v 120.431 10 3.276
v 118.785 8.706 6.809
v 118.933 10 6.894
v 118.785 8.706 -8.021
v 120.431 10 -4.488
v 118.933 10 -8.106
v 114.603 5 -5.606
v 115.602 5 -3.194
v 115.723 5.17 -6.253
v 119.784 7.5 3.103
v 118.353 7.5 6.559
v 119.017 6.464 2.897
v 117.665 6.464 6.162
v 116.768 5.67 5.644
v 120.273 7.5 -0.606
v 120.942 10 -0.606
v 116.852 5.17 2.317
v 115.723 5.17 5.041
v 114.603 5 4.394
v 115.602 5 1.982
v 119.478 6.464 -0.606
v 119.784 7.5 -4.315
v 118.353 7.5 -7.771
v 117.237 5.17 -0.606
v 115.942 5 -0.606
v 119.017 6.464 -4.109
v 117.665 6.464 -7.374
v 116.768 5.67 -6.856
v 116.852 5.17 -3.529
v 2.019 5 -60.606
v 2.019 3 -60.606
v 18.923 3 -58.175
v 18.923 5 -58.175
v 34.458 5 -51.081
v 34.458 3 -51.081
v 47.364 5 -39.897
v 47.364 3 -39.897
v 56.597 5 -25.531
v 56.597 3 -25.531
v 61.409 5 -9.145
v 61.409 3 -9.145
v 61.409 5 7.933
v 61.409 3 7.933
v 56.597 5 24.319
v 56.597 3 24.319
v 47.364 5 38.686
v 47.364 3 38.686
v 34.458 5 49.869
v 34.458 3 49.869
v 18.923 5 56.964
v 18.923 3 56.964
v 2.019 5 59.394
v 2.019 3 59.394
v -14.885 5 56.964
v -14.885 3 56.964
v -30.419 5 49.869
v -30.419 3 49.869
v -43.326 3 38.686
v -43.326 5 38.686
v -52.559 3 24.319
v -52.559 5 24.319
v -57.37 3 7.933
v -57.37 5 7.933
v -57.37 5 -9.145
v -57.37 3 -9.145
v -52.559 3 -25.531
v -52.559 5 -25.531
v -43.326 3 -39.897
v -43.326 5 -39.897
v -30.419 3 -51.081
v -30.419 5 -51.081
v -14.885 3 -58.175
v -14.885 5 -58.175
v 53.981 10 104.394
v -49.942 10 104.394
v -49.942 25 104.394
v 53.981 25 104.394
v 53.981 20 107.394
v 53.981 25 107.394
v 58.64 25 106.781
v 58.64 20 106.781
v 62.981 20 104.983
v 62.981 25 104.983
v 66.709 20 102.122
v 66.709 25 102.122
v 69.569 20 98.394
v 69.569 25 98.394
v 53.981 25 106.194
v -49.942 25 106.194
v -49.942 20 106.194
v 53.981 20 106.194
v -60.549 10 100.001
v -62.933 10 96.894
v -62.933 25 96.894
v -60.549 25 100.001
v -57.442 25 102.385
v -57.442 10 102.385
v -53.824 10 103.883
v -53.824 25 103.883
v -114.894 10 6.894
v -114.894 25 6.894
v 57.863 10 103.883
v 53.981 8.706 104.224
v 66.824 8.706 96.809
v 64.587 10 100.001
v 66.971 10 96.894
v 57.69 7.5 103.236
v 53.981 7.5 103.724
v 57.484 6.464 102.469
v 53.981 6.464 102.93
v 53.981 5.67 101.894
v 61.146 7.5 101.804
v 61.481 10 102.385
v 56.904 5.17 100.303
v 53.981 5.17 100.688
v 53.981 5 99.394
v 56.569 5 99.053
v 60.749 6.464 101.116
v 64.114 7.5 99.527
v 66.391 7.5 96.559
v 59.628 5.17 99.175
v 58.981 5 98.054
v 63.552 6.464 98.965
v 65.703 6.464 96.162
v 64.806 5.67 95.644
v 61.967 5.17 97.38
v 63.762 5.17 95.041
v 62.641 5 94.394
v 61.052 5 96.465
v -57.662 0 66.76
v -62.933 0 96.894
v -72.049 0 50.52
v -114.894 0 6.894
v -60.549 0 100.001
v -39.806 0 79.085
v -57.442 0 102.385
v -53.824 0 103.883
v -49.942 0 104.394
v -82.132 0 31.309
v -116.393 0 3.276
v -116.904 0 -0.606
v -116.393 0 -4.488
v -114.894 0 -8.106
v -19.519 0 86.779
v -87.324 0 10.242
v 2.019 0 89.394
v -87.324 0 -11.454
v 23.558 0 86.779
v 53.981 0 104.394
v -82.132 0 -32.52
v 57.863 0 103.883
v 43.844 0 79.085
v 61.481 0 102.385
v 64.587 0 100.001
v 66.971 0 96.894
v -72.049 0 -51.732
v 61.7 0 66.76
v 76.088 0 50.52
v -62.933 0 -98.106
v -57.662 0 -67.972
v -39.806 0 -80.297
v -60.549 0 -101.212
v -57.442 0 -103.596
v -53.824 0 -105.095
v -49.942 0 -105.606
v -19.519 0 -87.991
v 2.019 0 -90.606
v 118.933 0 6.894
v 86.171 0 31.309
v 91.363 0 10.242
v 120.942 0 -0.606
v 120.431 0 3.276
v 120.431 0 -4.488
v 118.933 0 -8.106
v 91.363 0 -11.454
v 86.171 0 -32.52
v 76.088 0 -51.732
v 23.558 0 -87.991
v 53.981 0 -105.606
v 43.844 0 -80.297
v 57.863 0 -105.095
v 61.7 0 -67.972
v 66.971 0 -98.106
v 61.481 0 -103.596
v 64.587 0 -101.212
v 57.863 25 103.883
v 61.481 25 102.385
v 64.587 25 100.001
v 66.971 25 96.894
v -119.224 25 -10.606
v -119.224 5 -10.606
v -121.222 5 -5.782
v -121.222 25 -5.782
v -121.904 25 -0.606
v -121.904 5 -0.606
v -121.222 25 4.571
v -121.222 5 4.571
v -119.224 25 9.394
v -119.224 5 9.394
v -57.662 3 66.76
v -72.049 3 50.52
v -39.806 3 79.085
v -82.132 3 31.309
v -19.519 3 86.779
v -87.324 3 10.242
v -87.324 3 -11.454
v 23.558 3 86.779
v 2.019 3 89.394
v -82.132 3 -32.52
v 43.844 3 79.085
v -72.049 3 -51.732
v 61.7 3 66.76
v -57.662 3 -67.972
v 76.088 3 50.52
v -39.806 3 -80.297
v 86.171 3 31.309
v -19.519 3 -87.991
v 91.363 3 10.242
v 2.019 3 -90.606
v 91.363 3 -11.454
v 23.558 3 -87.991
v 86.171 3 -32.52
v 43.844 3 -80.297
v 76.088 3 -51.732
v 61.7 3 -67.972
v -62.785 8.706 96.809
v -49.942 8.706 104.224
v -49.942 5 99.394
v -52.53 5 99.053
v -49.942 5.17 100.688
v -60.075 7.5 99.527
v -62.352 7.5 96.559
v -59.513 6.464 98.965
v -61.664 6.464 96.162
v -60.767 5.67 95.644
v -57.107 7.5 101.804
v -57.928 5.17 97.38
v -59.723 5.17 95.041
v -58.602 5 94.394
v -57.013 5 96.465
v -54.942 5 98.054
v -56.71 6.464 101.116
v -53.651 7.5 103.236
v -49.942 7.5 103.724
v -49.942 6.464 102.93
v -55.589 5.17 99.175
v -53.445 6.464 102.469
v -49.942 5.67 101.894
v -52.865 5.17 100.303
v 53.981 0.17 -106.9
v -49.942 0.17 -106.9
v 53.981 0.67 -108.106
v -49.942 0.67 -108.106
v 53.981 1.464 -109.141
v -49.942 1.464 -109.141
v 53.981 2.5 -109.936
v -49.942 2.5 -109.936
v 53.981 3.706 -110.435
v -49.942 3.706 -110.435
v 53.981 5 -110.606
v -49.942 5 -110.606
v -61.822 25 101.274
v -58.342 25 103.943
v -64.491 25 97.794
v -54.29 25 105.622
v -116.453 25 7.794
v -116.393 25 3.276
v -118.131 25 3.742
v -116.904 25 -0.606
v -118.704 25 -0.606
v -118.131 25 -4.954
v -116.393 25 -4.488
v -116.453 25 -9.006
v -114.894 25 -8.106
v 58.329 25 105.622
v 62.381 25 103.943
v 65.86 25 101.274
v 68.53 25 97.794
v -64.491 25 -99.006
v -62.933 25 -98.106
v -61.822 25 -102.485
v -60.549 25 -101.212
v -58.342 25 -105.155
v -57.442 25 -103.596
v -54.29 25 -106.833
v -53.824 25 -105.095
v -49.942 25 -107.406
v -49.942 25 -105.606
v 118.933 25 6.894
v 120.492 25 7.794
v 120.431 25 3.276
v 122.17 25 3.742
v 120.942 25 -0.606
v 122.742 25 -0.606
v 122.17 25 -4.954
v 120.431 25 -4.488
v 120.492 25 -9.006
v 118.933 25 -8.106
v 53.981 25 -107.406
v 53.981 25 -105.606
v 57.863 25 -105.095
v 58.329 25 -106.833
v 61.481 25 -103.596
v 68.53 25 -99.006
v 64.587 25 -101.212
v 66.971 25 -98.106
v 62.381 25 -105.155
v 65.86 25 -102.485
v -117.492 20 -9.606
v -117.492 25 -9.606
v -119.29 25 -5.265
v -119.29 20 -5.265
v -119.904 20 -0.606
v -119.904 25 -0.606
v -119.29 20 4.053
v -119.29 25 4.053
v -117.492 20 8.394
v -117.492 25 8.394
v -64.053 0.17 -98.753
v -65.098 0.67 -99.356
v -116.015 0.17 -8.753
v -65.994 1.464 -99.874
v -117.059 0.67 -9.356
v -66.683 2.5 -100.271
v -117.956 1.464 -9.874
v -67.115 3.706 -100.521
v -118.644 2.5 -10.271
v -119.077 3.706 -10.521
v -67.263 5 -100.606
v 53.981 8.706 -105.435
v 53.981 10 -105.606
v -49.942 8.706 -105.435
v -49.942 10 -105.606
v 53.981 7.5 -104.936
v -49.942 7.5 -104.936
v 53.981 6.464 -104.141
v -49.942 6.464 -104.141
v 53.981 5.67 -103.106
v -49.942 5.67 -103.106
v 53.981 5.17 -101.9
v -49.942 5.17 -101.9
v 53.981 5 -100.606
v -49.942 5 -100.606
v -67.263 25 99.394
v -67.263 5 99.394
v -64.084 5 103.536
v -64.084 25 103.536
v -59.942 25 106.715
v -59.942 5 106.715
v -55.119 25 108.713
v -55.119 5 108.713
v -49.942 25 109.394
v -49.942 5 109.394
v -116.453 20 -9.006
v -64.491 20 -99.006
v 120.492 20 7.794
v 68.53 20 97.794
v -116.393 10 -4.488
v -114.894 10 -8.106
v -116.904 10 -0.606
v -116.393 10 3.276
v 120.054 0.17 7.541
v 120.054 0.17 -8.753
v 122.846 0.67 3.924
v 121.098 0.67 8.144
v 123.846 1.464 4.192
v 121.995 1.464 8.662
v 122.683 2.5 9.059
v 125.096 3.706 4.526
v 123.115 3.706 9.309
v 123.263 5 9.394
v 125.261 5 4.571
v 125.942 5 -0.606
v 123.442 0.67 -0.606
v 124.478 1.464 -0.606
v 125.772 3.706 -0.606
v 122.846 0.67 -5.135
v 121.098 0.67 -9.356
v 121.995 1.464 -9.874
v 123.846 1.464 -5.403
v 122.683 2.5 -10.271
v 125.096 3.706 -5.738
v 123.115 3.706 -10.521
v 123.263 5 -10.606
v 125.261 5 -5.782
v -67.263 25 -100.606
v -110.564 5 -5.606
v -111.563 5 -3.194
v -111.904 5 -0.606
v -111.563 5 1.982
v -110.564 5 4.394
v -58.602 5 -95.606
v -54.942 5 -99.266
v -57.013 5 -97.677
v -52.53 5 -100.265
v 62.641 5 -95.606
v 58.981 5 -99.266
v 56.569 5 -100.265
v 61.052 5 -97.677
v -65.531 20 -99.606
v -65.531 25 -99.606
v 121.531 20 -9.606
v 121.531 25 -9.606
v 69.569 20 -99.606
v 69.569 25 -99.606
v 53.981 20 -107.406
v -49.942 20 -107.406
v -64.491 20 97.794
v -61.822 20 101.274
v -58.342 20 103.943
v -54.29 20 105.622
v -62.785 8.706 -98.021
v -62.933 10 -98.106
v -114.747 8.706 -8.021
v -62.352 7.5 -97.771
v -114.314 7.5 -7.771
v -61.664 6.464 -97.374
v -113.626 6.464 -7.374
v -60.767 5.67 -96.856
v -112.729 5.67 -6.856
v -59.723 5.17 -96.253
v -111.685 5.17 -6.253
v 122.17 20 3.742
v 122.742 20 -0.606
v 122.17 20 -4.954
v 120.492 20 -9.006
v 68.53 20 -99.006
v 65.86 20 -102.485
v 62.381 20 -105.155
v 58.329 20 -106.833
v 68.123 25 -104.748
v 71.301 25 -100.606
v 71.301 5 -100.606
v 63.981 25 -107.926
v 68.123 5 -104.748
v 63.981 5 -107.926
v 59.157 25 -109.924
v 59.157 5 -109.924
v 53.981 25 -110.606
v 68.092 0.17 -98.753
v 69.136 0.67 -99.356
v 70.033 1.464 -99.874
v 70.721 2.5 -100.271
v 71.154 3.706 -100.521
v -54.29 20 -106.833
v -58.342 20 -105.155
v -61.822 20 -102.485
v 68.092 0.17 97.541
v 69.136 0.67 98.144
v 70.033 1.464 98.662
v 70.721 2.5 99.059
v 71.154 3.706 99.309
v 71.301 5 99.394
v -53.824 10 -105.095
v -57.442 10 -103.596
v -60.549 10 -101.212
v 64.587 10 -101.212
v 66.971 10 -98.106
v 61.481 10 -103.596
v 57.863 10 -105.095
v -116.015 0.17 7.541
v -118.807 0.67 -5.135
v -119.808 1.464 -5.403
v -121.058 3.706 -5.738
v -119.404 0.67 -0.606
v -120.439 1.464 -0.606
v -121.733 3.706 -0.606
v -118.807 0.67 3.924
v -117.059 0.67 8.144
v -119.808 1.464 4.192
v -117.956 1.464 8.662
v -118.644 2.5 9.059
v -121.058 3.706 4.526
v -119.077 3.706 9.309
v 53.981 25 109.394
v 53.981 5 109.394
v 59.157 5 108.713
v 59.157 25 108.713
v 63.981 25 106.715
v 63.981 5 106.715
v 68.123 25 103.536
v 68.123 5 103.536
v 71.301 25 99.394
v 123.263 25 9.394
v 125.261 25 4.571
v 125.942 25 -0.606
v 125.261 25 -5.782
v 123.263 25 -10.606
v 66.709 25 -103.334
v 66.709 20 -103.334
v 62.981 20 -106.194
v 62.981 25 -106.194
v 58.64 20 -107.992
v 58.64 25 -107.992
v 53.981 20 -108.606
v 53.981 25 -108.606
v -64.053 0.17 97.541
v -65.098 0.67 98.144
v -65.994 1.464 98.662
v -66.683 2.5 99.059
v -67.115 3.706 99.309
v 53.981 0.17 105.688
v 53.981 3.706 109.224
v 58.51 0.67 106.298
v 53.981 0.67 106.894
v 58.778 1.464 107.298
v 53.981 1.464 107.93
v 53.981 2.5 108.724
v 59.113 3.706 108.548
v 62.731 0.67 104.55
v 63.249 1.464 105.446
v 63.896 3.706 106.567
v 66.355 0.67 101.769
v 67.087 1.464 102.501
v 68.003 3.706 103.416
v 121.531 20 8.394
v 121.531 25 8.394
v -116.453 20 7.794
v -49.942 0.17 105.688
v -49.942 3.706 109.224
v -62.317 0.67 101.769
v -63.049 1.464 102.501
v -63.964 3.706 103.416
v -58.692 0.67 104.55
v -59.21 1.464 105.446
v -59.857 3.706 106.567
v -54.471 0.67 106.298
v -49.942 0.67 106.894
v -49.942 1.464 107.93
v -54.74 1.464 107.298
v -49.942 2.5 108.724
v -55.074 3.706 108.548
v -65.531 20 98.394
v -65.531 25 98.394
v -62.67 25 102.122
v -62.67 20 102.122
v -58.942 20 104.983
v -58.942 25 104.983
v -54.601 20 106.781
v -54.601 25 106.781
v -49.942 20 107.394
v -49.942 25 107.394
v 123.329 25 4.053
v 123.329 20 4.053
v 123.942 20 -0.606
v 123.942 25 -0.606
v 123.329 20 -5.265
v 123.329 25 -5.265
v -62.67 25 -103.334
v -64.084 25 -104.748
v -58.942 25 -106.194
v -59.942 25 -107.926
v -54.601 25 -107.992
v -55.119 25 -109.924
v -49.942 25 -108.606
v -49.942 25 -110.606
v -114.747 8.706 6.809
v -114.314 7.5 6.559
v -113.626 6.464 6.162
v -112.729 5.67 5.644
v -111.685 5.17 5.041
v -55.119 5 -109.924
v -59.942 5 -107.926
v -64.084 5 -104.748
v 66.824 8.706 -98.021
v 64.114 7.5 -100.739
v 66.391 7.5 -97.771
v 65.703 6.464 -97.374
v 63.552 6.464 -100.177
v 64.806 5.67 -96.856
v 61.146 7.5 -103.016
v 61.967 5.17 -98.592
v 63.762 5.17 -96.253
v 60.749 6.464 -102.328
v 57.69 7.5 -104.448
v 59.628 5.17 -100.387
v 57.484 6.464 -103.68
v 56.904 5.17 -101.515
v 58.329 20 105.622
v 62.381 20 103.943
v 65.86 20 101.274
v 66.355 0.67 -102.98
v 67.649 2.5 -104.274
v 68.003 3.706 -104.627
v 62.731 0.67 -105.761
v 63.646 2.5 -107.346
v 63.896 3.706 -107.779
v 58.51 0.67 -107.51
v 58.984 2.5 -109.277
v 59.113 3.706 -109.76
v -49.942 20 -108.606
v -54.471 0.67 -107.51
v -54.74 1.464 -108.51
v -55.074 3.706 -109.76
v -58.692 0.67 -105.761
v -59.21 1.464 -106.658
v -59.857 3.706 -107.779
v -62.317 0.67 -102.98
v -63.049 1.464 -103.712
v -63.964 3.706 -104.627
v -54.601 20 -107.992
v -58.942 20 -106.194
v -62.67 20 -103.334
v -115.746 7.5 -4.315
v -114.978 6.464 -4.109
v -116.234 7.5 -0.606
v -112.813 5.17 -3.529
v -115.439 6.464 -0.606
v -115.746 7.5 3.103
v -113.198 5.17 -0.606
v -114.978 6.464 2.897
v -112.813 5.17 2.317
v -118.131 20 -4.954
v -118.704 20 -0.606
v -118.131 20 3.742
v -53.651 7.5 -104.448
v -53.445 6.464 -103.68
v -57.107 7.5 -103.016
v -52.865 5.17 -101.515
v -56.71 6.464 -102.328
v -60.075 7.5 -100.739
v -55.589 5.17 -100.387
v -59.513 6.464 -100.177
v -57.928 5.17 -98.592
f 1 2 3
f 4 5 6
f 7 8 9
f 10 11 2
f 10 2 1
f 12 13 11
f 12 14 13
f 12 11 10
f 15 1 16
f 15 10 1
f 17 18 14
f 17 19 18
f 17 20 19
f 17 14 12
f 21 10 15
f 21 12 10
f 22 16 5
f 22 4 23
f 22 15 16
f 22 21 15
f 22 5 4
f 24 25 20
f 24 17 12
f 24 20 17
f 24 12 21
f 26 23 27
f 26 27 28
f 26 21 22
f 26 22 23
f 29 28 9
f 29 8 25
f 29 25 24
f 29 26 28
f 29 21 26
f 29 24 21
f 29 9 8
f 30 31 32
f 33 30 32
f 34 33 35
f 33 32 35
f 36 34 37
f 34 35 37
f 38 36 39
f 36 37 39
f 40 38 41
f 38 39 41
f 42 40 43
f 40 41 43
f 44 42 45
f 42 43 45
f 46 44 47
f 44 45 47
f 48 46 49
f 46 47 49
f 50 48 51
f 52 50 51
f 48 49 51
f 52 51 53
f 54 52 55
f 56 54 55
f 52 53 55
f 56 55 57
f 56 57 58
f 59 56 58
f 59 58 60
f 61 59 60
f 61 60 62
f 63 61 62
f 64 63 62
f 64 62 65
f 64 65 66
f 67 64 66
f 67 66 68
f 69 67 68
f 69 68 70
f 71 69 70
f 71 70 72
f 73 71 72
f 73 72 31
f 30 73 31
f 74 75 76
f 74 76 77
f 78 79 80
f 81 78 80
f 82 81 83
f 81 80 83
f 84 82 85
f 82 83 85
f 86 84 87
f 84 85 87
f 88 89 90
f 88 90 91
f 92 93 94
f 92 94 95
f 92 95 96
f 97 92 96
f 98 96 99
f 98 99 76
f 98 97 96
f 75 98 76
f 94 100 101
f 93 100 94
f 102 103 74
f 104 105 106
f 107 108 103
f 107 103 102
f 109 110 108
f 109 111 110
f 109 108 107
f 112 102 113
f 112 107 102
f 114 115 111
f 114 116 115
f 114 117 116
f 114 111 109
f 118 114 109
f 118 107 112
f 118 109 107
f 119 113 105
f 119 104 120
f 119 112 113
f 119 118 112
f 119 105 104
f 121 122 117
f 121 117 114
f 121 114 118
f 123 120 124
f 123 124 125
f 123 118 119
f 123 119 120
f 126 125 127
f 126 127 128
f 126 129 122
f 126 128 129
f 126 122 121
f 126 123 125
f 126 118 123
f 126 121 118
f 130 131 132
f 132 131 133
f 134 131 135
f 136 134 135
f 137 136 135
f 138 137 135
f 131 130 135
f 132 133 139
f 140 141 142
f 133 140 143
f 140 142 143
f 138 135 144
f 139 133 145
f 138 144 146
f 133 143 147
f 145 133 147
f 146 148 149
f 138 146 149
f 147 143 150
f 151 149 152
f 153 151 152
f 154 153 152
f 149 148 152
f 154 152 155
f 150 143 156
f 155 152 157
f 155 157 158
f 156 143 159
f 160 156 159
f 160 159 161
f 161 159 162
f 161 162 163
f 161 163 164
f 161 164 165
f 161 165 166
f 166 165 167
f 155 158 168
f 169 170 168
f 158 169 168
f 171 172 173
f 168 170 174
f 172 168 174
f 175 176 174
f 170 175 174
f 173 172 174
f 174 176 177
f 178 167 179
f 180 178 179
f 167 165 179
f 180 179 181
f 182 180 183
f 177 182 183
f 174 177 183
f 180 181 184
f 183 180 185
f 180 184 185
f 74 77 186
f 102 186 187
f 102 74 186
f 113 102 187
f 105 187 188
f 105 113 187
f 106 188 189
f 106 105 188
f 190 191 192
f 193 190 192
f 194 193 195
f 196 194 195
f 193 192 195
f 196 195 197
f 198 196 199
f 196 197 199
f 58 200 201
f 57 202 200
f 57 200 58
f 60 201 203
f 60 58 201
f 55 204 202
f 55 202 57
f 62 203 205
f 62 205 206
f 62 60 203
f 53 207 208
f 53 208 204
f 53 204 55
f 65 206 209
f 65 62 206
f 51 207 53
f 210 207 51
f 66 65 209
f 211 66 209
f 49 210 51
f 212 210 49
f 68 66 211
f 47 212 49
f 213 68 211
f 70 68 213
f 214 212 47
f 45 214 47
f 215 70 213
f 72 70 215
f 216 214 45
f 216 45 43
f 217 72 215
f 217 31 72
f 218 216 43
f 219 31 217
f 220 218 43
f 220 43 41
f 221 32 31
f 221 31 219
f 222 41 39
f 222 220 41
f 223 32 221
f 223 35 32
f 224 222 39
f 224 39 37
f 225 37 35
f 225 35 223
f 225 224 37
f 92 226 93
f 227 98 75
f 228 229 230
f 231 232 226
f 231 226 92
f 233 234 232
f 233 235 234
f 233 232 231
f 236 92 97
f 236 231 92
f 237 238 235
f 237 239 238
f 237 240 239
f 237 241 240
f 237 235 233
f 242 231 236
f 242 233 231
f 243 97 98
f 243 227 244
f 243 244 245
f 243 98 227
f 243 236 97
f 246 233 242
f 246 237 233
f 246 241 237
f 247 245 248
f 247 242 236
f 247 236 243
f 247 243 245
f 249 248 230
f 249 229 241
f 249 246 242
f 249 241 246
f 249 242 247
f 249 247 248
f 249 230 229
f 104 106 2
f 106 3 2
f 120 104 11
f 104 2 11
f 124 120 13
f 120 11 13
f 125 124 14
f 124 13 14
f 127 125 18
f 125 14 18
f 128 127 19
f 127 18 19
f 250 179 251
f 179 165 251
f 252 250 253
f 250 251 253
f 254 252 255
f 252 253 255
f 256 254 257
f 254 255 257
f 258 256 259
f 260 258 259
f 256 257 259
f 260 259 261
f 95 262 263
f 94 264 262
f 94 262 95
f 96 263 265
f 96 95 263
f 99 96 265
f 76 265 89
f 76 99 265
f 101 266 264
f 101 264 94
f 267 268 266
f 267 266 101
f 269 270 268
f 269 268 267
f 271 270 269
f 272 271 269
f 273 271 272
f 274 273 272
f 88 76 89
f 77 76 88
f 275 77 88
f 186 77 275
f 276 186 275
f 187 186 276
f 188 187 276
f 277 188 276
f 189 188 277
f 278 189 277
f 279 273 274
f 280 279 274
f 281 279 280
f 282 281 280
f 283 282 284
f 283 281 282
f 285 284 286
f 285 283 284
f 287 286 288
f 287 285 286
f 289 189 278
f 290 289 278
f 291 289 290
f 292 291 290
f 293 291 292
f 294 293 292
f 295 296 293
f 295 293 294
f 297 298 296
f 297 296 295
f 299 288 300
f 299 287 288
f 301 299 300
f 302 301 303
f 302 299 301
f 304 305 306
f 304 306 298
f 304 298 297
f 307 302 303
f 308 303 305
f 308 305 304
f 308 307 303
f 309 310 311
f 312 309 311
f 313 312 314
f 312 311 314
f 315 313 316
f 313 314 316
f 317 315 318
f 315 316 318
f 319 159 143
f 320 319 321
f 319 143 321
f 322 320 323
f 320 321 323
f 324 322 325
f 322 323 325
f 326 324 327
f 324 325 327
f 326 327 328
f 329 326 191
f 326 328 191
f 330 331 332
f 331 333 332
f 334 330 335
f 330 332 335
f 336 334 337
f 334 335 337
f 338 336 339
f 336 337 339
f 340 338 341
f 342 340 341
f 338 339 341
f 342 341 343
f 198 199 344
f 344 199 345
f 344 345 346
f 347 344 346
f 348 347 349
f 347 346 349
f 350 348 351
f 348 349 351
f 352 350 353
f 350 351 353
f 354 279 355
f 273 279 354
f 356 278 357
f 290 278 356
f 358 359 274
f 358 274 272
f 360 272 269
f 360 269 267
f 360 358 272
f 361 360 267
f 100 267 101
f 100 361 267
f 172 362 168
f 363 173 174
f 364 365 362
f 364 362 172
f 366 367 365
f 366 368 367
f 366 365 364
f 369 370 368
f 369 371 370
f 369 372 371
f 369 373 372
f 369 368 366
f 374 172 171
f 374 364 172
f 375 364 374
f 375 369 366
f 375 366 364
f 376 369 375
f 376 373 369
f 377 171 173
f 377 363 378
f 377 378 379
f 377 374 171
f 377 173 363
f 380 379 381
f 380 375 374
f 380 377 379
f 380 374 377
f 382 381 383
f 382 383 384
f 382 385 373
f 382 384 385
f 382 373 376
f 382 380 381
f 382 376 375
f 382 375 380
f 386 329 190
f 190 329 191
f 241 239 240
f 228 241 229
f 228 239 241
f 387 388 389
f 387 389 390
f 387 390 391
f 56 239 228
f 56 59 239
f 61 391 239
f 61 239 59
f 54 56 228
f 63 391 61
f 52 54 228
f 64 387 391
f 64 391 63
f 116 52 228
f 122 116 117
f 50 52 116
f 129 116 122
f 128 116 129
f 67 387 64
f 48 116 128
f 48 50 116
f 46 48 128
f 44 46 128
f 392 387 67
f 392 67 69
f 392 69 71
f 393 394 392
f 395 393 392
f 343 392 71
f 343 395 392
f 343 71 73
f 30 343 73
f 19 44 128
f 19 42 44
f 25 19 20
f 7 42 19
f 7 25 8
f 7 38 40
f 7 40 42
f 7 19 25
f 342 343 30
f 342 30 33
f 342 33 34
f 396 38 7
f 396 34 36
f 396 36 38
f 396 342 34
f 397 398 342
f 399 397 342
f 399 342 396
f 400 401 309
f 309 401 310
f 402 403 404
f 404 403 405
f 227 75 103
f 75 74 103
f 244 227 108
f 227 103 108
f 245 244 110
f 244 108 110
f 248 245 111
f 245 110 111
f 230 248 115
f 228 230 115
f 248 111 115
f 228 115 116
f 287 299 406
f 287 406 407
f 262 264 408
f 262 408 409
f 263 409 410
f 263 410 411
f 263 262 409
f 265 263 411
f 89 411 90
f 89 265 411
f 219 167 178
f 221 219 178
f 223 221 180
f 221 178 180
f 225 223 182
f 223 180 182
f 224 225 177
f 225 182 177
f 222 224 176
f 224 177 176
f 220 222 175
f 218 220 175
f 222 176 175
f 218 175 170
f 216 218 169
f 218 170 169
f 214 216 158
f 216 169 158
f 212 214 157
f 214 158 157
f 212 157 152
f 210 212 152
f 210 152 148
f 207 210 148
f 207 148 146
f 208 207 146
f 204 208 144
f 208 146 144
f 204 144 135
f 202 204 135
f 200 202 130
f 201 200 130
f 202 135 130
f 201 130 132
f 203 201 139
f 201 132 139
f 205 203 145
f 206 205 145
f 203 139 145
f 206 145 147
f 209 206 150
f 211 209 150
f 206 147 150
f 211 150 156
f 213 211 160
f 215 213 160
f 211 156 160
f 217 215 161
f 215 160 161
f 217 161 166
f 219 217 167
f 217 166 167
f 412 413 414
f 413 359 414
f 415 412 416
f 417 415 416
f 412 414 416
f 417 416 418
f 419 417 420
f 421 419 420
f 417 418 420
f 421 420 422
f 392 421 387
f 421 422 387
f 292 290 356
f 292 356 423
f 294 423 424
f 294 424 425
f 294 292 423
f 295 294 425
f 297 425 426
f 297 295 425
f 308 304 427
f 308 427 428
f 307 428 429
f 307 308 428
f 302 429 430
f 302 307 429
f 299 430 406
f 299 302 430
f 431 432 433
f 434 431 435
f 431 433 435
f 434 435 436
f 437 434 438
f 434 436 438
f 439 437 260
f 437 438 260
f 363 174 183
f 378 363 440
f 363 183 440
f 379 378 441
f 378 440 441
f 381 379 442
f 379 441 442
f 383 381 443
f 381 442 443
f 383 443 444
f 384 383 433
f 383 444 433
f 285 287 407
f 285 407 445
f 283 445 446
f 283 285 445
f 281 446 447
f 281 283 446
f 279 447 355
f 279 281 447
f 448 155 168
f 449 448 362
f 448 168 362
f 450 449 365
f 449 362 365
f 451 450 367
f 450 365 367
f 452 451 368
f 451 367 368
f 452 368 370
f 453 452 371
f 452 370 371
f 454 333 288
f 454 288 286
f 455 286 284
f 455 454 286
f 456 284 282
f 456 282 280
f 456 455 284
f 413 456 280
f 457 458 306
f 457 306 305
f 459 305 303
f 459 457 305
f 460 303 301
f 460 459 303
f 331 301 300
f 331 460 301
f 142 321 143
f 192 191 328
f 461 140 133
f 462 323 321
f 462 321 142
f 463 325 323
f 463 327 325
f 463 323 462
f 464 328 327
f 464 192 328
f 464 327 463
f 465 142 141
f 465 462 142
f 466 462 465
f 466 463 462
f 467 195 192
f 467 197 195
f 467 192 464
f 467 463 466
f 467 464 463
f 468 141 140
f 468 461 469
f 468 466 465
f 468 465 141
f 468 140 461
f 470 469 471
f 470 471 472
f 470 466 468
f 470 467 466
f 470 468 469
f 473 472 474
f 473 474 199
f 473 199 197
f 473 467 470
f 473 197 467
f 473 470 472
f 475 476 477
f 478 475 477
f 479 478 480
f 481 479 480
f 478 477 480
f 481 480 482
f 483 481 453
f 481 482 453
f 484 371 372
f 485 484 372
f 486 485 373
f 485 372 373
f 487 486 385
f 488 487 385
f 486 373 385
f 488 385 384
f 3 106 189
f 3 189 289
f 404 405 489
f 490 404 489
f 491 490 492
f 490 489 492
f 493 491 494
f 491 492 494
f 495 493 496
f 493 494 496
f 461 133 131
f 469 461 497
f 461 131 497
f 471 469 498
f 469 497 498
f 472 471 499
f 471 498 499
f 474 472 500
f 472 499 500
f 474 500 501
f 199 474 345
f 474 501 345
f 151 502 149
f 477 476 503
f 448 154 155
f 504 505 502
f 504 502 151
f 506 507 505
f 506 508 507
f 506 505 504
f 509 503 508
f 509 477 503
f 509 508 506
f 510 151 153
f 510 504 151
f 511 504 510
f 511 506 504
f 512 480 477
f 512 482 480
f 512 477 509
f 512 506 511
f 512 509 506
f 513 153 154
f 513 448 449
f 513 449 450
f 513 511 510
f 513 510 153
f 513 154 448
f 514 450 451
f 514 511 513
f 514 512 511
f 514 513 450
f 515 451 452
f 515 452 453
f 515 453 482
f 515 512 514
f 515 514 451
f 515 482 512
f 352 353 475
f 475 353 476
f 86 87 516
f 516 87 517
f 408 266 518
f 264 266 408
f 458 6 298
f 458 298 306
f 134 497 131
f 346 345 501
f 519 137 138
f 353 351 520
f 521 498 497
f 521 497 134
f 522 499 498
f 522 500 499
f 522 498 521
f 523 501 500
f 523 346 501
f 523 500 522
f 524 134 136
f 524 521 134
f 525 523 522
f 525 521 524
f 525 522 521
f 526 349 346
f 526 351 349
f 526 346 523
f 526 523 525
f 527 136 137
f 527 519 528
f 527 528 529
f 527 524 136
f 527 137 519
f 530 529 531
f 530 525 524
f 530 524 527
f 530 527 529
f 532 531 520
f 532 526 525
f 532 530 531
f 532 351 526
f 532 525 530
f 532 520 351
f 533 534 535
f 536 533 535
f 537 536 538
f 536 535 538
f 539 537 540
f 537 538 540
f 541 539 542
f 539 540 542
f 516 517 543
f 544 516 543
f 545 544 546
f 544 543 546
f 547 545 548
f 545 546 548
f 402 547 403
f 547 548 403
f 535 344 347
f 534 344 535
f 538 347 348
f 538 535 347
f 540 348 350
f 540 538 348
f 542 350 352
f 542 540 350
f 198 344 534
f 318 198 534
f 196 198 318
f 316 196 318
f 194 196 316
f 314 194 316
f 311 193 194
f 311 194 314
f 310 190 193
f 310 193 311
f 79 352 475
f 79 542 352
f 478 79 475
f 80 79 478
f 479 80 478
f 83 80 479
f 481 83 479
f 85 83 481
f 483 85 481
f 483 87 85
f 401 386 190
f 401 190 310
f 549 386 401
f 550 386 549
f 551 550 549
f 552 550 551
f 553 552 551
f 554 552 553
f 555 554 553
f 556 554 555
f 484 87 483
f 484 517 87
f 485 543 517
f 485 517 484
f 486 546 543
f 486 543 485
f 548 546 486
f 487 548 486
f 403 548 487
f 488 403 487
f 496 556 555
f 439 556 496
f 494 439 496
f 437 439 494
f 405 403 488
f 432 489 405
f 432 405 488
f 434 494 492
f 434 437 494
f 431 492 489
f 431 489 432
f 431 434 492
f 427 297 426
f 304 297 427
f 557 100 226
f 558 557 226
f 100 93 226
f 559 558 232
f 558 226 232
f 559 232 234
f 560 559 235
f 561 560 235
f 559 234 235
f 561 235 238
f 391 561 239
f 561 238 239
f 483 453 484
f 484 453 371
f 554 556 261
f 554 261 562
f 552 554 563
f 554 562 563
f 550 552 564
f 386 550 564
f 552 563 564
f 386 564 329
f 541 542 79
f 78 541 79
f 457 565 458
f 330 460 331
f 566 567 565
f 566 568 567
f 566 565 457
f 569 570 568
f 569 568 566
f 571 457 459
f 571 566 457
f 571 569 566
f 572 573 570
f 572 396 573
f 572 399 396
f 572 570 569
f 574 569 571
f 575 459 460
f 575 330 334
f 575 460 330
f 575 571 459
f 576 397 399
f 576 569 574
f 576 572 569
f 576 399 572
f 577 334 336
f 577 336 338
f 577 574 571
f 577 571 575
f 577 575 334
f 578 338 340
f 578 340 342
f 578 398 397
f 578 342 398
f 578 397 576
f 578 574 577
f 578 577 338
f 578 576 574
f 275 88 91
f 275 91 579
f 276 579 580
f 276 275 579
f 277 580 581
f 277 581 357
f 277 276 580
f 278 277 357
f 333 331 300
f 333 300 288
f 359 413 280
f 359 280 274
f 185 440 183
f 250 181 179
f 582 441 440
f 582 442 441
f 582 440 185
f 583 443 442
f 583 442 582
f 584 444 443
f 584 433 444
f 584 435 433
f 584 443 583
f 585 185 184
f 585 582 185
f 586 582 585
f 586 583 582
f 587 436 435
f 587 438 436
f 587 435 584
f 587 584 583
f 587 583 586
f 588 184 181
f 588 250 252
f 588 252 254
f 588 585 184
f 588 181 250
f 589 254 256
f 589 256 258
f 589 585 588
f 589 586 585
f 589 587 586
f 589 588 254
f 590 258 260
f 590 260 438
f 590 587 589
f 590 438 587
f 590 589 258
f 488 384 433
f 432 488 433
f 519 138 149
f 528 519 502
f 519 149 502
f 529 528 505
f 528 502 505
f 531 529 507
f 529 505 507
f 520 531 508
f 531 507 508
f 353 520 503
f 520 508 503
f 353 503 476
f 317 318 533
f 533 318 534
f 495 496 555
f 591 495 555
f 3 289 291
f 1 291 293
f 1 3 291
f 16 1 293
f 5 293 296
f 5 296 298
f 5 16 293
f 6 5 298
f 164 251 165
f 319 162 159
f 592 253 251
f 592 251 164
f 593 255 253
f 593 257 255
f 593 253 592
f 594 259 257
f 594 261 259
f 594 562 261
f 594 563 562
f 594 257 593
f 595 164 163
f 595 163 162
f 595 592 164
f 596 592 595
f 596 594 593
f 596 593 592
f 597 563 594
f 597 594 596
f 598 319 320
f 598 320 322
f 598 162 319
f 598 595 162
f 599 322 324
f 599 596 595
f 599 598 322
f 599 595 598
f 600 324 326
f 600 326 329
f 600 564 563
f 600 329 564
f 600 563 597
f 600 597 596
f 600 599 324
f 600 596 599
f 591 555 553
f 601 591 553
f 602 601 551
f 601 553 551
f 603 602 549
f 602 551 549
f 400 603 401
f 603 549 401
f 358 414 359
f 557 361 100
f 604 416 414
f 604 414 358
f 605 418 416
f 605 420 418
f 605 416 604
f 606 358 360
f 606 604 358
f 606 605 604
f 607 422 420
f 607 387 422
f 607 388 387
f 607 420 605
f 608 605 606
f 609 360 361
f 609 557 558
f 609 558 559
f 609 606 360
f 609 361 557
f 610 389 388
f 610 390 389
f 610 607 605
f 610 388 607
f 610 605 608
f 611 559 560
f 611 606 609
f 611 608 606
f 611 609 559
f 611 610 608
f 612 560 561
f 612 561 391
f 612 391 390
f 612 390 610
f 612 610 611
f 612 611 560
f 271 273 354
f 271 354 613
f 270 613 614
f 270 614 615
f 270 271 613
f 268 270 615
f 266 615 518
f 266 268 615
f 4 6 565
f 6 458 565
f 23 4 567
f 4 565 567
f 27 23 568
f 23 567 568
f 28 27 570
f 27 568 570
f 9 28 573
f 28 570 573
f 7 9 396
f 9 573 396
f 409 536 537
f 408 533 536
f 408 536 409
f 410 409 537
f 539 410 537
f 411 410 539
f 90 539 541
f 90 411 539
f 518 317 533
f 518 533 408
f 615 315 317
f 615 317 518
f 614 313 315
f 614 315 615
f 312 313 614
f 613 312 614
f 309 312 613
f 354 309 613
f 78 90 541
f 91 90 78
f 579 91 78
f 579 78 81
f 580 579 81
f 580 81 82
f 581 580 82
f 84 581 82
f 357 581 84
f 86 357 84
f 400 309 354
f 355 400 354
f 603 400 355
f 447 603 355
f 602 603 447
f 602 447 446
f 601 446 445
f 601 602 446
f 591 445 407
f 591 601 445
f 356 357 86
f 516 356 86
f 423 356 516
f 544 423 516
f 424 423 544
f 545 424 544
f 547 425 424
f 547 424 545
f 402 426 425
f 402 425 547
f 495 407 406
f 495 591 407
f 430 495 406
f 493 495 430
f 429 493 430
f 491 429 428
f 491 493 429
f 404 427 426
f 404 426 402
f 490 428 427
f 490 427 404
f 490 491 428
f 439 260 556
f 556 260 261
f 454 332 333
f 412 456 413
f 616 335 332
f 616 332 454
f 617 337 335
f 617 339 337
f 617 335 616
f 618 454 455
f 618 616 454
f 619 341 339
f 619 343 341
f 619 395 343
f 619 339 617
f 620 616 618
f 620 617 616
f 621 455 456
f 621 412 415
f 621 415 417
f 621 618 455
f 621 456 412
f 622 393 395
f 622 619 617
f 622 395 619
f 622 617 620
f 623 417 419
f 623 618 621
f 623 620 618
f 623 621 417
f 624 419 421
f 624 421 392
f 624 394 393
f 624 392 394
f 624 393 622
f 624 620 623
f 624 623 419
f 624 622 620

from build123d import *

# Parameters (mm, degrees)
SALIENTE_EXTRUIR2_DEPTH = 5
SALIENTE_EXTRUIR3_DEPTH = 20
REDONDEO2_R             = 5
REDONDEO3_R             = 5
CROQUIS4_R              = 60
CORTAR_EXTRUIR1_DEPTH   = 10
CROQUIS3_R              = 90
CORTAR_EXTRUIR2_DEPTH   = 3
CORTAR_EXTRUIR3_DEPTH   = 5


with BuildPart() as part:
    # Croquis1 → Saliente-Extruir2 (new body)
    with BuildSketch(Plane(origin=(0, 0, 0), x_dir=(1, 0, 0), z_dir=(0, 1, 0))):
        with BuildLine():
            Line((-119.224191345, -9.394190445), (-67.262667118, -99.394190445))
            ThreePointArc((-67.262667118, -99.394190445), (-59.942159042, -106.71469852), (-49.942159042, -109.394190445))
            Line((-49.942159042, -109.394190445), (53.980889412, -109.394190445))
            ThreePointArc((53.980889412, -109.394190445), (63.980889412, -106.71469852), (71.301397487, -99.394190445))
            Line((71.301397487, -99.394190445), (123.262921714, -9.394190445))
            ThreePointArc((123.262921714, -9.394190445), (125.942413639, 0.605809555), (123.262921714, 10.605809555))
            Line((123.262921714, 10.605809555), (71.301397487, 100.605809555))
            ThreePointArc((71.301397487, 100.605809555), (63.980889412, 107.926317631), (53.980889412, 110.605809555))
            Line((53.980889412, 110.605809555), (-49.942159042, 110.605809555))
            ThreePointArc((-49.942159042, 110.605809555), (-59.942159042, 107.926317631), (-67.262667118, 100.605809555))
            Line((-67.262667118, 100.605809555), (-119.224191345, 10.605809555))
            ThreePointArc((-119.224191345, 10.605809555), (-121.90368327, 0.605809555), (-119.224191345, -9.394190445))
        make_face()
    extrude(amount=SALIENTE_EXTRUIR2_DEPTH)

    # Croquis2 → Saliente-Extruir3 (add)
    with BuildSketch(Plane(origin=(0, 5, 0), x_dir=(1, 0, 0), z_dir=(0, 1, 0))):
        with BuildLine():
            Line((-67.262667118, 100.605809555), (-119.224191345, 10.605809555))
            ThreePointArc((-119.224191345, 10.605809555), (-121.90368327, 0.605809555), (-119.224191345, -9.394190445))
            Line((-119.224191345, -9.394190445), (-67.262667118, -99.394190445))
            ThreePointArc((-67.262667118, -99.394190445), (-59.942159042, -106.71469852), (-49.942159042, -109.394190445))
            Line((-49.942159042, -109.394190445), (53.980889412, -109.394190445))
            ThreePointArc((53.980889412, -109.394190445), (63.980889412, -106.71469852), (71.301397487, -99.394190445))
            Line((71.301397487, -99.394190445), (123.262921714, -9.394190445))
            ThreePointArc((123.262921714, -9.394190445), (125.942413639, 0.605809555), (123.262921714, 10.605809555))
            Line((123.262921714, 10.605809555), (71.301397487, 100.605809555))
            ThreePointArc((71.301397487, 100.605809555), (63.980889412, 107.926317631), (53.980889412, 110.605809555))
            Line((53.980889412, 110.605809555), (-49.942159042, 110.605809555))
            ThreePointArc((-49.942159042, 110.605809555), (-59.942159042, 107.926317631), (-67.262667118, 100.605809555))
        make_face()
        with BuildLine():
            Line((-62.932540099, 98.105809555), (-114.894064326, 8.105809555))
            ThreePointArc((-114.894064326, 8.105809555), (-116.90368327, 0.605809555), (-114.894064326, -6.894190445))
            Line((-114.894064326, -6.894190445), (-62.932540099, -96.894190445))
            ThreePointArc((-62.932540099, -96.894190445), (-57.442159042, -102.384571501), (-49.942159042, -104.394190445))
            Line((-49.942159042, -104.394190445), (53.980889412, -104.394190445))
            ThreePointArc((53.980889412, -104.394190445), (61.480889412, -102.384571501), (66.971270468, -96.894190445))
            Line((66.971270468, -96.894190445), (118.932794695, -6.894190445))
            ThreePointArc((118.932794695, -6.894190445), (120.942413639, 0.605809555), (118.932794695, 8.105809555))
            Line((118.932794695, 8.105809555), (66.971270468, 98.105809555))
            ThreePointArc((66.971270468, 98.105809555), (61.480889412, 103.596190612), (53.980889412, 105.605809555))
            Line((53.980889412, 105.605809555), (-49.942159042, 105.605809555))
            ThreePointArc((-49.942159042, 105.605809555), (-57.442159042, 103.596190612), (-62.932540099, 98.105809555))
        make_face(mode=Mode.SUBTRACT)
    extrude(amount=SALIENTE_EXTRUIR3_DEPTH)

    # Redondeo2
    redondeo2_edges = [part.edges().sort_by_distance(p)[0] for p in [
        (2.019365185, 0, -110.605809555),
        (63.980889412, 0, -107.926317631),
        (97.282159601, 0, -55.605809555),
        (125.942413639, 0, -0.605809555),
        (97.282159601, 0, 54.394190445),
        (63.980889412, 0, 106.71469852),
        (2.019365185, 0, 109.394190445),
        (-59.942159042, 0, 106.71469852),
        (-93.243429232, 0, 54.394190445),
        (-121.90368327, 0, -0.605809555),
        (-93.243429232, 0, -55.605809555),
        (-59.942159042, 0, -107.926317631),
    ]]
    fillet(redondeo2_edges, radius=REDONDEO2_R)

    # Redondeo3
    redondeo3_edges = [part.edges().sort_by_distance(p)[0] for p in [
        (-57.442159042, 5, -103.596190612),
        (-88.913302213, 5, -53.105809555),
        (-116.90368327, 5, -0.605809555),
        (-88.913302213, 5, 51.894190445),
        (-57.442159042, 5, 102.384571501),
        (2.019365185, 5, 104.394190445),
        (61.480889412, 5, 102.384571501),
        (92.952032582, 5, 51.894190445),
        (120.942413639, 5, -0.605809555),
        (92.952032582, 5, -53.105809555),
        (61.480889412, 5, -103.596190612),
        (2.019365185, 5, -105.605809555),
    ]]
    fillet(redondeo3_edges, radius=REDONDEO3_R)

    # Croquis4 → Cortar-Extruir1 (cut)
    with BuildSketch(Plane(origin=(0, 0, 0), x_dir=(-1, 0, 0), z_dir=(0, -1, 0))):
        with Locations(Location((-2.019365185, 0.605809555, 0), (0, 0, 90))):
            Circle(CROQUIS4_R)
    extrude(amount=-CORTAR_EXTRUIR1_DEPTH, mode=Mode.SUBTRACT)

    # Croquis3 → Cortar-Extruir2 (cut)
    with BuildSketch(Plane.XZ):
        with Locations(Location((2.019365185, -0.605809555, 0), (0, 0, 270))):
            Circle(CROQUIS3_R)
    extrude(amount=-CORTAR_EXTRUIR2_DEPTH, mode=Mode.SUBTRACT)

    # Croquis5 → Cortar-Extruir3 (cut)
    with BuildSketch(Plane(origin=(0, 25, 0), x_dir=(1, 0, 0), z_dir=(0, 1, 0))):
        with BuildLine():
            Line((-65.530616311, 99.605809555), (-117.492140538, 9.605809555))
            ThreePointArc((-117.492140538, 9.605809555), (-119.90368327, 0.605809555), (-117.492140538, -8.394190445))
            Line((-117.492140538, -8.394190445), (-65.530616311, -98.394190445))
            ThreePointArc((-65.530616311, -98.394190445), (-58.942159042, -104.982647713), (-49.942159042, -107.394190445))
            Line((-49.942159042, -107.394190445), (53.980889412, -107.394190445))
            ThreePointArc((53.980889412, -107.394190445), (62.980889412, -104.982647713), (69.56934668, -98.394190445))
            Line((69.56934668, -98.394190445), (121.530870907, -8.394190445))
            ThreePointArc((121.530870907, -8.394190445), (123.942413639, 0.605809555), (121.530870907, 9.605809555))
            Line((121.530870907, 9.605809555), (69.56934668, 99.605809555))
            ThreePointArc((69.56934668, 99.605809555), (62.980889412, 106.194266823), (53.980889412, 108.605809555))
            Line((53.980889412, 108.605809555), (-49.942159042, 108.605809555))
            ThreePointArc((-49.942159042, 108.605809555), (-58.942159042, 106.194266823), (-65.530616311, 99.605809555))
        make_face()
        with BuildLine():
            Line((-64.491385826, 99.005809555), (-116.452910053, 9.005809555))
            ThreePointArc((-116.452910053, 9.005809555), (-118.70368327, 0.605809555), (-116.452910053, -7.794190445))
            Line((-116.452910053, -7.794190445), (-64.491385826, -97.794190445))
            ThreePointArc((-64.491385826, -97.794190445), (-58.342159042, -103.943417228), (-49.942159042, -106.194190445))
            Line((-49.942159042, -106.194190445), (53.980889412, -106.194190445))
            ThreePointArc((53.980889412, -106.194190445), (62.380889412, -103.943417228), (68.530116195, -97.794190445))
            Line((68.530116195, -97.794190445), (120.491640422, -7.794190445))
            ThreePointArc((120.491640422, -7.794190445), (122.742413639, 0.605809555), (120.491640422, 9.005809555))
            Line((120.491640422, 9.005809555), (68.530116195, 99.005809555))
            ThreePointArc((68.530116195, 99.005809555), (62.380889412, 105.155036339), (53.980889412, 107.405809555))
            Line((53.980889412, 107.405809555), (-49.942159042, 107.405809555))
            ThreePointArc((-49.942159042, 107.405809555), (-58.342159042, 105.155036339), (-64.491385826, 99.005809555))
        make_face(mode=Mode.SUBTRACT)
    extrude(amount=-CORTAR_EXTRUIR3_DEPTH, mode=Mode.SUBTRACT)


solid = part.part
